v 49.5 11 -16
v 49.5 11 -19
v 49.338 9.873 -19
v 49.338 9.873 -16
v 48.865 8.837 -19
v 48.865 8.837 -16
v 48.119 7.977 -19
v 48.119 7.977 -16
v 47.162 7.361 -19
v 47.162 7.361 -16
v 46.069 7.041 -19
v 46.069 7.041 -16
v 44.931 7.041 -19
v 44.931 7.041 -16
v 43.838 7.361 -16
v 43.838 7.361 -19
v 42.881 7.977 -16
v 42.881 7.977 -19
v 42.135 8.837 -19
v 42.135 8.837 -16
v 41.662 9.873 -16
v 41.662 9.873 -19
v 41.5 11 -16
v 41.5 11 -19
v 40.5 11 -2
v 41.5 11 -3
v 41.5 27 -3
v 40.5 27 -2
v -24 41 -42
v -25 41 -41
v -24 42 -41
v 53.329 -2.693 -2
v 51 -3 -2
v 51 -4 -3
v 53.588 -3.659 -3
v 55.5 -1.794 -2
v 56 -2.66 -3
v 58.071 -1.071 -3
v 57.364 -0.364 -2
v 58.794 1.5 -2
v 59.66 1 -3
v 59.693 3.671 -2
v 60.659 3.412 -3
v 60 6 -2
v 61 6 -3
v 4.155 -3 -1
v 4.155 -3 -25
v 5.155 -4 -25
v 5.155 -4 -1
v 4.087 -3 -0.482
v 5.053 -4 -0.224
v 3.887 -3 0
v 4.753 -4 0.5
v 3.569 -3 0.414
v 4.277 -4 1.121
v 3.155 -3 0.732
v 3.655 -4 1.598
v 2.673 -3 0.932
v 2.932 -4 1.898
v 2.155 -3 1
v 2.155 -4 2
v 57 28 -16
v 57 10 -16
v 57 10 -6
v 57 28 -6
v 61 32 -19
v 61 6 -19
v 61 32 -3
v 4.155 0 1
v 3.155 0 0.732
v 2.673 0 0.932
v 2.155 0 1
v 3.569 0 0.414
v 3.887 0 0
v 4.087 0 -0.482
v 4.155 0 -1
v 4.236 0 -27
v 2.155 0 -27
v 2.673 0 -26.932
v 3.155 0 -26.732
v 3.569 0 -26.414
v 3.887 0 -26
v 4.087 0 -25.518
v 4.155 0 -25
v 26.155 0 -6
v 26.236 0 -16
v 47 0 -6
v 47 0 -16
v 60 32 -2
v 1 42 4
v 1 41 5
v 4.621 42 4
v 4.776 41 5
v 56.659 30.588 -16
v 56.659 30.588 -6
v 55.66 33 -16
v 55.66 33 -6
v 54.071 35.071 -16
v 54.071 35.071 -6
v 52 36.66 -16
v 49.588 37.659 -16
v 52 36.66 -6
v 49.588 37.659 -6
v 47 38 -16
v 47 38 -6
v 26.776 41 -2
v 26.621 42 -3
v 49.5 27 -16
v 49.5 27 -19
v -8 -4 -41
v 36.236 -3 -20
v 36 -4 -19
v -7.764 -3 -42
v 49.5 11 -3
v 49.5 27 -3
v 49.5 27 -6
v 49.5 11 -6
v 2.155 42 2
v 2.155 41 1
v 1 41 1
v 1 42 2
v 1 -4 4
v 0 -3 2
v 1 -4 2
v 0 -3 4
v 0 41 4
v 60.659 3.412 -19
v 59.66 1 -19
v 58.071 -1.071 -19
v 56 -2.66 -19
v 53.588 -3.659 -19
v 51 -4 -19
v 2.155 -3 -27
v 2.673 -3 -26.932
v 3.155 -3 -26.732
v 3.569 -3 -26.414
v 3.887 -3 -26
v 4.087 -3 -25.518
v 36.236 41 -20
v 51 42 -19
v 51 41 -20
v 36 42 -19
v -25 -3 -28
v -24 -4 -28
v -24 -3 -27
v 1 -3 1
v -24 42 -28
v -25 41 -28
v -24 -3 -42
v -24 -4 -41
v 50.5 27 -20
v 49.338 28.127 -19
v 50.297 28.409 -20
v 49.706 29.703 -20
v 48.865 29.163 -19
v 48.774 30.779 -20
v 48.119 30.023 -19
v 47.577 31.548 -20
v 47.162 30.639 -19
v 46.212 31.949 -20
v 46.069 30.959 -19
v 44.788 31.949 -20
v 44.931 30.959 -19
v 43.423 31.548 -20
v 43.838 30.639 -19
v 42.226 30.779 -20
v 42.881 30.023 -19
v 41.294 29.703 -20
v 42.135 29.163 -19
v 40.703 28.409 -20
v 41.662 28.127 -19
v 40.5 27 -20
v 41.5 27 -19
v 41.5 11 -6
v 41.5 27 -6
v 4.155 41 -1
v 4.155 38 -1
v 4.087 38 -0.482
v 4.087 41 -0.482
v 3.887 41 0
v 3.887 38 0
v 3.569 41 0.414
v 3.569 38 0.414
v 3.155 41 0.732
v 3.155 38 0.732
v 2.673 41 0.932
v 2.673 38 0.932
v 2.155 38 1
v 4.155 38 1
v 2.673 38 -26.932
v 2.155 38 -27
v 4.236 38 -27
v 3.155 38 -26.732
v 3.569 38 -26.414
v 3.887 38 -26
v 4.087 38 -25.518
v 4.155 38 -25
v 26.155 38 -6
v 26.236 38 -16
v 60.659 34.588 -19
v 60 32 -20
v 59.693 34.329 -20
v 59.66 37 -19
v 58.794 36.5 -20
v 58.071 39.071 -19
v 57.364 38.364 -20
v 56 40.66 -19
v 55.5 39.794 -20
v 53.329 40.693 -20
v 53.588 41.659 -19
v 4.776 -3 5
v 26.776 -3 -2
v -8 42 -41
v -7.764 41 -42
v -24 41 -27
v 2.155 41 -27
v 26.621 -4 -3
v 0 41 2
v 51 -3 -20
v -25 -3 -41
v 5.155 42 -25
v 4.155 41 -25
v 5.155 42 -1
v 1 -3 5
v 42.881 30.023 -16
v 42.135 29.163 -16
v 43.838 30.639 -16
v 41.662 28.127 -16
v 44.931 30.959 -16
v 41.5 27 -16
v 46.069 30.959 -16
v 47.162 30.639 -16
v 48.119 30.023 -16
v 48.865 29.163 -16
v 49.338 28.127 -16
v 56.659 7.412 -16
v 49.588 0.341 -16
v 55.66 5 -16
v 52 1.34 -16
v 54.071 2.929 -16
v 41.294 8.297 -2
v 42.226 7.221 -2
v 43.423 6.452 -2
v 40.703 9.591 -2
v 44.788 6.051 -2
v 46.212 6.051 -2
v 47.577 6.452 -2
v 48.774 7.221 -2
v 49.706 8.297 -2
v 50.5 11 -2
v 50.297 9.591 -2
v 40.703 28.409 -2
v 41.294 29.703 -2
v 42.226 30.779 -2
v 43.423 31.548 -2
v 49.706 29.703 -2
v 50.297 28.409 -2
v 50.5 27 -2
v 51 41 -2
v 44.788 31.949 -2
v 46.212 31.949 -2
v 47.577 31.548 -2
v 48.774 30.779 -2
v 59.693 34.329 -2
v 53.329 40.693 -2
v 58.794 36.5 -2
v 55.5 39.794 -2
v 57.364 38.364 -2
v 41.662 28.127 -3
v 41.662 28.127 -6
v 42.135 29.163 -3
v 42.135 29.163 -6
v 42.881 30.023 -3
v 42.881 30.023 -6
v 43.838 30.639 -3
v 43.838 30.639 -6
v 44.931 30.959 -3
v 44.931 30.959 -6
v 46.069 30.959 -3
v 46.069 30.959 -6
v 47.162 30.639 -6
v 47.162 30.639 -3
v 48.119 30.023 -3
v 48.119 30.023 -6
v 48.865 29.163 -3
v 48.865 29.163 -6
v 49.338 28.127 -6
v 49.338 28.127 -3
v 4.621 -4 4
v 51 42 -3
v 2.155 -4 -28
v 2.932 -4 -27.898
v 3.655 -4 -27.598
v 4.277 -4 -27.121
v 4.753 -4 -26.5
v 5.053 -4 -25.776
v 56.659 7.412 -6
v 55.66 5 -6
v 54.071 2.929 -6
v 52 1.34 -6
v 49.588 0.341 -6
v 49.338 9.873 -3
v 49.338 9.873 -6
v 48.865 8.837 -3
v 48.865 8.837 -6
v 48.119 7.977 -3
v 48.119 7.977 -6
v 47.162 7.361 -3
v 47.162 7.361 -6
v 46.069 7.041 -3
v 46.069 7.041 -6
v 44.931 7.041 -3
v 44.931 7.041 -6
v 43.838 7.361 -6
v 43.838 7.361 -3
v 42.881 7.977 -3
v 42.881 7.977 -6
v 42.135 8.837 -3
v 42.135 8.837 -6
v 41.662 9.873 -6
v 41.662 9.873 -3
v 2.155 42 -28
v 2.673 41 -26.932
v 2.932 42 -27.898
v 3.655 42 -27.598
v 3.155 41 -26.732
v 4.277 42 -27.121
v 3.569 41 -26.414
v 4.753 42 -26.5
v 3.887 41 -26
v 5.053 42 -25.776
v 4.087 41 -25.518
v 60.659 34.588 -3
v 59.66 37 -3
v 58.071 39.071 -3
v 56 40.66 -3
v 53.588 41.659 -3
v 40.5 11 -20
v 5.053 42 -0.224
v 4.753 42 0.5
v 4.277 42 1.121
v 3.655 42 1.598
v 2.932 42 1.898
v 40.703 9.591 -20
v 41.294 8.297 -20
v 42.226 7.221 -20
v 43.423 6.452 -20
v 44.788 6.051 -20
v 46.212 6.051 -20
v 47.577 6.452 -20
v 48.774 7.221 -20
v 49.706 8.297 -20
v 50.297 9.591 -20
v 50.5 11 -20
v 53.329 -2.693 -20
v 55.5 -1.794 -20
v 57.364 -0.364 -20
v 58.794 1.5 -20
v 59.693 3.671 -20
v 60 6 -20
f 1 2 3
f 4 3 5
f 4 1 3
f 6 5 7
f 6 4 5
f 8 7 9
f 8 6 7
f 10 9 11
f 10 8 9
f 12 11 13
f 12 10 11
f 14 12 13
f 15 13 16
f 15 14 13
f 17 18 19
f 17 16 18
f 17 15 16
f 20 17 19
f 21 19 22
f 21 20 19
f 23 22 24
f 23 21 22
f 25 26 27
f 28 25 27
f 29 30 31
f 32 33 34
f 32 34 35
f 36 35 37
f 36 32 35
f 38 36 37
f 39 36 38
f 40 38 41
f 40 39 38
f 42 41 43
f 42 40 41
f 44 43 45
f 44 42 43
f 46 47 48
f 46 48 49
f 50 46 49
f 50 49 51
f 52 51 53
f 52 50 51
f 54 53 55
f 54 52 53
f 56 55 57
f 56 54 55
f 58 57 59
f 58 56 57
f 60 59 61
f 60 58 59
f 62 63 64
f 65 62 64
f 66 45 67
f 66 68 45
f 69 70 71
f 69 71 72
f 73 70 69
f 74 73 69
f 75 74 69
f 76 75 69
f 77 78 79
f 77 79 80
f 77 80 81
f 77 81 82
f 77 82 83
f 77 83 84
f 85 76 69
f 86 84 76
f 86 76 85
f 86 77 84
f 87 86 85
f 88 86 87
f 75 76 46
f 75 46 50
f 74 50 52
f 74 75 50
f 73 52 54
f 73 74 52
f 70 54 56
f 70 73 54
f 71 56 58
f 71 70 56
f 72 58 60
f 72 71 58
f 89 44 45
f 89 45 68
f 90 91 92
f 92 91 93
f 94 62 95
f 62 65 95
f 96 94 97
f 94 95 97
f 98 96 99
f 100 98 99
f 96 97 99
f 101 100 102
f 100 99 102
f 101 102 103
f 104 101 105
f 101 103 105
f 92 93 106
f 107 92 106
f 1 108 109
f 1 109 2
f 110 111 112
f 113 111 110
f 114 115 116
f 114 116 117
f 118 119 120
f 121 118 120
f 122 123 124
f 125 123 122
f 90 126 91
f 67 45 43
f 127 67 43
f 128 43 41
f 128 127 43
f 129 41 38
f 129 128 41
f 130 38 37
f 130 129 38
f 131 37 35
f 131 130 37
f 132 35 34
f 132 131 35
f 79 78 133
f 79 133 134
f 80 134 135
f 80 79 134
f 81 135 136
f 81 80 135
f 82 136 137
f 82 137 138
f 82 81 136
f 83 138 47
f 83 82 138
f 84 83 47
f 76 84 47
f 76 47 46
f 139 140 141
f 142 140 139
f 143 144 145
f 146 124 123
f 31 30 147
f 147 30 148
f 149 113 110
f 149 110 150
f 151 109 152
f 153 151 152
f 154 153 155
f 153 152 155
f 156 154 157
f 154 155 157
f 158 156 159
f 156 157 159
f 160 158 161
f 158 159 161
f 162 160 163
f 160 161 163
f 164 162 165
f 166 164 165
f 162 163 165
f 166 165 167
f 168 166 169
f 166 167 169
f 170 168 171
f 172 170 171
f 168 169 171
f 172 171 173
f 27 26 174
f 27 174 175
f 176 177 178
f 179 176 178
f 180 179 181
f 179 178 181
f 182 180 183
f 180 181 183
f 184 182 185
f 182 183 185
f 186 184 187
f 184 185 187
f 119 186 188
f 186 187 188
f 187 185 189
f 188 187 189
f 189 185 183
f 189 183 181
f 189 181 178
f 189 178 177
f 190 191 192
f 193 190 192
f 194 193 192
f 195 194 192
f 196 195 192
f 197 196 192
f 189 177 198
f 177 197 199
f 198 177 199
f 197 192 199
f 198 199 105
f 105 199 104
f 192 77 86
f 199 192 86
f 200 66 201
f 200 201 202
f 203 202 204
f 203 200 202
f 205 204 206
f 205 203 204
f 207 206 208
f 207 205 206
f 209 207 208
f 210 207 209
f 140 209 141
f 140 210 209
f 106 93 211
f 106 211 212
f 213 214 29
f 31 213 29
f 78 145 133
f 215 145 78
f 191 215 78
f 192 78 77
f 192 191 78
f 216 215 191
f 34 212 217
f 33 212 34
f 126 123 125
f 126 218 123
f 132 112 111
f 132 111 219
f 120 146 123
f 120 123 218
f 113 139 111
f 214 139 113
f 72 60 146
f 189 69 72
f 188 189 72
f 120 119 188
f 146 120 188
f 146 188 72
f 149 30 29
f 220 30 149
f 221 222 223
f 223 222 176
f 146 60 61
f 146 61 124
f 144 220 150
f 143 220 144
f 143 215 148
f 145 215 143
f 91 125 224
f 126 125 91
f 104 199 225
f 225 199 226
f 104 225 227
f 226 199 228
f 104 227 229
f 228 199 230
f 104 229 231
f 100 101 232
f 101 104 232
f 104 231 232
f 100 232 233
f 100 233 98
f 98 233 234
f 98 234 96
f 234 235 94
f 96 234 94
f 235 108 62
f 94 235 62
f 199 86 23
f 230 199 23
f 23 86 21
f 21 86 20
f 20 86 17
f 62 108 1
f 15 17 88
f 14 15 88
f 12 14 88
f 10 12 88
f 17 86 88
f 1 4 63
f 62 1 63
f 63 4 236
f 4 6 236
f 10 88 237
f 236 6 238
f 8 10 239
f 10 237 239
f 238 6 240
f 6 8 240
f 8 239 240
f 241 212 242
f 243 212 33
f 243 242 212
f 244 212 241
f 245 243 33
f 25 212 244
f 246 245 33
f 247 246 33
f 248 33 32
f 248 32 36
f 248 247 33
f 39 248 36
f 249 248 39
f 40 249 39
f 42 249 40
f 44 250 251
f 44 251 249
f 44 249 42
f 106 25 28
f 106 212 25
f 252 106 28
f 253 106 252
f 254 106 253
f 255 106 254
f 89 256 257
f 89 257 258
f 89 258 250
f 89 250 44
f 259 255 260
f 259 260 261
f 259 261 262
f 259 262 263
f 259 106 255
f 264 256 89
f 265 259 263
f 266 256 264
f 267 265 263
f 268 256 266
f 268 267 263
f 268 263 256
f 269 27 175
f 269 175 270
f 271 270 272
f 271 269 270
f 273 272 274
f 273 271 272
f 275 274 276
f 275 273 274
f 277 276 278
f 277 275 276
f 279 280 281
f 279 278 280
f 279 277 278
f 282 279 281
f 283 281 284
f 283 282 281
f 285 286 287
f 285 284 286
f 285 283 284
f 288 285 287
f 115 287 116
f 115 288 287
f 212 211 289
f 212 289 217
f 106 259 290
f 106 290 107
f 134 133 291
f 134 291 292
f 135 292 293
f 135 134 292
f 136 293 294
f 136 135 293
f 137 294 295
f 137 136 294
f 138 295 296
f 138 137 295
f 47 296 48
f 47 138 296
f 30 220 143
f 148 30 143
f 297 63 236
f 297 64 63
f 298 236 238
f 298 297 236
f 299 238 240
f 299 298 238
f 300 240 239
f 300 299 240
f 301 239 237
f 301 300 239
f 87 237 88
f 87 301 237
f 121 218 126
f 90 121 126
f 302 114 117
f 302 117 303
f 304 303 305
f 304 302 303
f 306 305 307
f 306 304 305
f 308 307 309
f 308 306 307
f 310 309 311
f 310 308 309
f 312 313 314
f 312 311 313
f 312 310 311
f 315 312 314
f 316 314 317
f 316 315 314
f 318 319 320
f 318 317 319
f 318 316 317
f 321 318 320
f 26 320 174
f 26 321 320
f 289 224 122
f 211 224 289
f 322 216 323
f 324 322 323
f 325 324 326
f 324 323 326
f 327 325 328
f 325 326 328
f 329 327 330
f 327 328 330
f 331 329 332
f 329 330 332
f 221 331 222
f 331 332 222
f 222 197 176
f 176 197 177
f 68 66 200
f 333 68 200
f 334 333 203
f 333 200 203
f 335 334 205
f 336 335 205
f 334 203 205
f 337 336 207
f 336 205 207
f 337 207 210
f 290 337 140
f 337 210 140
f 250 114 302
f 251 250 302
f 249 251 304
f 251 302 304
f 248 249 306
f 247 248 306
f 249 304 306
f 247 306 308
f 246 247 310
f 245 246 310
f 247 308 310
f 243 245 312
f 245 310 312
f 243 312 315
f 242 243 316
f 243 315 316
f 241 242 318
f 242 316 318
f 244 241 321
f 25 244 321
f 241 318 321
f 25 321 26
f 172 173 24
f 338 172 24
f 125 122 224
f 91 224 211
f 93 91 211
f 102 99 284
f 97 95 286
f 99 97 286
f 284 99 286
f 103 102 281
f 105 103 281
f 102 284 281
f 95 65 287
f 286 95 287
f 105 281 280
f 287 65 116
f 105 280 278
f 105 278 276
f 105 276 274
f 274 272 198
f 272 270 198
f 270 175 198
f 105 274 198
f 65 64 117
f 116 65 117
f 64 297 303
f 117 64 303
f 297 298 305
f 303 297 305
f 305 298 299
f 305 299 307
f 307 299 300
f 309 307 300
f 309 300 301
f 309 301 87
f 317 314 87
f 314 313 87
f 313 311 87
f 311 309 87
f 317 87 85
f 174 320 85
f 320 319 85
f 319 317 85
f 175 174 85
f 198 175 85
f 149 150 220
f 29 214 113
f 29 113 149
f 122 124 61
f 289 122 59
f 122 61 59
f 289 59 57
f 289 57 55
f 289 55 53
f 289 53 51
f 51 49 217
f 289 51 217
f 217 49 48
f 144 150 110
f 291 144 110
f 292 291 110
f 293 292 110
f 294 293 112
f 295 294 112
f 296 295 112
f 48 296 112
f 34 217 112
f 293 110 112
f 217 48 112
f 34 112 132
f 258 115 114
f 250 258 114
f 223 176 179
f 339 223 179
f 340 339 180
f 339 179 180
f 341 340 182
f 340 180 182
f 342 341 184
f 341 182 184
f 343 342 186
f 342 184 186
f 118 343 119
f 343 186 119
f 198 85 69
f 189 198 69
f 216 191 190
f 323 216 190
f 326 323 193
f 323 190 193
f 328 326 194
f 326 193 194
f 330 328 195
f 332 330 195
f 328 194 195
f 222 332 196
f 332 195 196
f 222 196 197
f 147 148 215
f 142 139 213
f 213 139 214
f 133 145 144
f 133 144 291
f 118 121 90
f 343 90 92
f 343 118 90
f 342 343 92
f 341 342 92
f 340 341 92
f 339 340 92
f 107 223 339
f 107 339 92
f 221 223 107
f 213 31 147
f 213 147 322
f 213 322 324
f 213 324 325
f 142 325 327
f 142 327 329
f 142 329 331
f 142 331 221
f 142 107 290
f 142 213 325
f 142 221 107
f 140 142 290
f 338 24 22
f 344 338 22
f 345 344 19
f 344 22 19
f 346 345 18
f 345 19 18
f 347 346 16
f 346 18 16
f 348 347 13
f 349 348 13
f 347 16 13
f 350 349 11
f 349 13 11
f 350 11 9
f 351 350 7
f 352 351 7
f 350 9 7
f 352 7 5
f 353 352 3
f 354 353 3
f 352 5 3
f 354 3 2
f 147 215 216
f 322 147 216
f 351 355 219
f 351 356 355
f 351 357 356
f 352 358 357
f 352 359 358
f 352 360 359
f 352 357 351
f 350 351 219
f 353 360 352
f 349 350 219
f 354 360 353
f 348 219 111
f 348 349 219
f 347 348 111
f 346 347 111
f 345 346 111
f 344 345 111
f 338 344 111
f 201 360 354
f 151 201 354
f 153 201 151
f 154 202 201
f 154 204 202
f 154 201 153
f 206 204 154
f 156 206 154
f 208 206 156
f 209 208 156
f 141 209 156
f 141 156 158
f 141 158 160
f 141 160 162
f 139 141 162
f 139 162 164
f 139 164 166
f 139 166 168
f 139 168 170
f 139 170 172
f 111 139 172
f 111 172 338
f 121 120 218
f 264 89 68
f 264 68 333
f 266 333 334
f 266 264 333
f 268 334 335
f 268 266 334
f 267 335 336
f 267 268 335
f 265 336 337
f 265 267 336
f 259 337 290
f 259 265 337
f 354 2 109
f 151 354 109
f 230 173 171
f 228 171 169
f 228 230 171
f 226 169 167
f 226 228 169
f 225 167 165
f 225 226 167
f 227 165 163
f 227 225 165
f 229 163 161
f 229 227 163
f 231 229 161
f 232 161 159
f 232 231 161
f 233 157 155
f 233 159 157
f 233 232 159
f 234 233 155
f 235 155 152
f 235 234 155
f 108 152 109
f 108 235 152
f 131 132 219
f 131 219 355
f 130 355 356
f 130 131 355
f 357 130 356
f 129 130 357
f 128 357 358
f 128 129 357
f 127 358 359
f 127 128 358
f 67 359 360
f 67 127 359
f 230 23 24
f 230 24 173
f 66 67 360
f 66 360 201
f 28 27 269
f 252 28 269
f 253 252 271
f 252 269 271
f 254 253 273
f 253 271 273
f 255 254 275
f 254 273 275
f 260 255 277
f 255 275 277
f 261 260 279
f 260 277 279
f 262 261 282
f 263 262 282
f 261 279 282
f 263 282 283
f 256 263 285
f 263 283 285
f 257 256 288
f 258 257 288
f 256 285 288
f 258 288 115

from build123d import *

# Parameters (mm, degrees)
CREATE_INTERNAL_GEOMETRY_DEPTH = 38
CUT_SHACKLE_HOLE_DEPTH         = 83.24962006
CAP_TOP_END_DEPTH              = 4
ROUND_CORNERS_R                = 10
UNNECESSARY_CHAMFERS_SIZE      = 1


with BuildPart() as part:
    # Sketch2 → Create internal geometry (new body)
    with BuildSketch(Plane(origin=(0, 0, 0), x_dir=(1, 0, 0), z_dir=(0, 1, 0))):
        Polygon((36.236067977, 20), (-7.763932023, 42), (-25, 42), (-25, 27), (4.236067977, 27), (26.236067977, 16), (57, 16), (57, 6), (26.155256109, 6), (4.155256109, -1), (0, -1), (0, -5), (4.776280544, -5), (26.776280544, 2), (61, 2), (61, 20), align=None)
    extrude(amount=CREATE_INTERNAL_GEOMETRY_DEPTH)

    # Sketch4 → Cut shackle hole (cut, through all)
    with BuildSketch(Plane.XY.offset(-2)):
        with BuildLine():
            Line((49.5, 27), (49.5, 11))
            ThreePointArc((49.5, 11), (45.5, 7), (41.5, 11))
            Line((41.5, 11), (41.5, 27))
            ThreePointArc((41.5, 27), (45.5, 31), (49.5, 27))
        make_face()
    extrude(amount=-CUT_SHACKLE_HOLE_DEPTH, mode=Mode.SUBTRACT)

    # Sketch3 → Cap top end (add)
    with BuildSketch(Plane(origin=(0, 38, 0), x_dir=(1, 0, 0), z_dir=(0, 1, 0))):
        with BuildLine():
            Line((-25, 27), (2.155256109, 27))
            ThreePointArc((2.155256109, 27), (3.569469671, 26.414213562), (4.155256109, 25))
            Line((4.155256109, 25), (4.155256109, 1))
            ThreePointArc((4.155256109, 1), (3.569469671, -0.414213562), (2.155256109, -1))
            Line((2.155256109, -1), (0, -1))
            Line((0, -1), (0, -5))
            Line((0, -5), (4.776280544, -5))
            Line((4.776280544, -5), (26.776280544, 2))
            Line((26.776280544, 2), (61, 2))
            Line((61, 2), (61, 20))
            Line((61, 20), (36.236067977, 20))
            Line((36.236067977, 20), (-7.763932023, 42))
            Line((-7.763932023, 42), (-25, 42))
            Line((-25, 42), (-25, 27))
        make_face()
    cap_top_end = extrude(amount=CAP_TOP_END_DEPTH)

    # Mirror top cap to bottom: Cap top end across plane
    add(cap_top_end.mirror(Plane.ZX.offset(19)))

    # Round corners
    round_corners_edges = [part.edges().sort_by_distance(p)[0] for p in [
        (61, -4, -11),
        (57, 0, -11),
        (57, 38, -11),
        (61, 42, -11),
    ]]
    fillet(round_corners_edges, radius=ROUND_CORNERS_R)

    # Unnecessary chamfers
    unnecessary_chamfers_edges = [part.edges().sort_by_distance(p)[0] for p in [
        (-25, -4, -34.5),
        (-16.381966011, -4, -42),
        (14.236067977, -4, -31),
        (38.888140272, -4, -2),
        (15.776280544, -4, 1.5),
        (2.388140272, -4, 5),
        (0, -4, 3),
        (1.077628054, -4, 1),
        (3.569469671, -4, 0.414213562),
        (4.155256109, -4, -13),
        (3.569469671, -4, -26.414213562),
        (-11.422371946, -4, -27),
        (43.618033989, 42, -20),
        (61, 19, -20),
        (43.618033989, -4, -20),
        (58.071067812, -1.071067812, -20),
        (58.071067812, 39.071067812, -20),
        (61, 19, -2),
        (58.071067812, -1.071067812, -2),
        (58.071067812, 39.071067812, -2),
        (0, 19, 1),
        (-25, 19, -27),
        (-25, 19, -42),
        (0, 19, 5),
        (45.5, 31, -20),
        (49.5, 19, -20),
        (45.5, 7, -20),
        (41.5, 19, -20),
        (45.5, 31, -2),
        (41.5, 19, -2),
        (45.5, 7, -2),
        (49.5, 19, -2),
        (-25, 42, -34.5),
        (-11.422371946, 42, -27),
        (3.569469671, 42, -26.414213562),
        (4.155256109, 42, -13),
        (3.569469671, 42, 0.414213562),
        (1.077628054, 42, 1),
        (0, 42, 3),
        (2.388140272, 42, 5),
        (15.776280544, 42, 1.5),
        (38.888140272, 42, -2),
        (14.236067977, 42, -31),
        (-16.381966011, 42, -42),
    ]]
    chamfer(unnecessary_chamfers_edges, length=UNNECESSARY_CHAMFERS_SIZE)


solid = part.part
